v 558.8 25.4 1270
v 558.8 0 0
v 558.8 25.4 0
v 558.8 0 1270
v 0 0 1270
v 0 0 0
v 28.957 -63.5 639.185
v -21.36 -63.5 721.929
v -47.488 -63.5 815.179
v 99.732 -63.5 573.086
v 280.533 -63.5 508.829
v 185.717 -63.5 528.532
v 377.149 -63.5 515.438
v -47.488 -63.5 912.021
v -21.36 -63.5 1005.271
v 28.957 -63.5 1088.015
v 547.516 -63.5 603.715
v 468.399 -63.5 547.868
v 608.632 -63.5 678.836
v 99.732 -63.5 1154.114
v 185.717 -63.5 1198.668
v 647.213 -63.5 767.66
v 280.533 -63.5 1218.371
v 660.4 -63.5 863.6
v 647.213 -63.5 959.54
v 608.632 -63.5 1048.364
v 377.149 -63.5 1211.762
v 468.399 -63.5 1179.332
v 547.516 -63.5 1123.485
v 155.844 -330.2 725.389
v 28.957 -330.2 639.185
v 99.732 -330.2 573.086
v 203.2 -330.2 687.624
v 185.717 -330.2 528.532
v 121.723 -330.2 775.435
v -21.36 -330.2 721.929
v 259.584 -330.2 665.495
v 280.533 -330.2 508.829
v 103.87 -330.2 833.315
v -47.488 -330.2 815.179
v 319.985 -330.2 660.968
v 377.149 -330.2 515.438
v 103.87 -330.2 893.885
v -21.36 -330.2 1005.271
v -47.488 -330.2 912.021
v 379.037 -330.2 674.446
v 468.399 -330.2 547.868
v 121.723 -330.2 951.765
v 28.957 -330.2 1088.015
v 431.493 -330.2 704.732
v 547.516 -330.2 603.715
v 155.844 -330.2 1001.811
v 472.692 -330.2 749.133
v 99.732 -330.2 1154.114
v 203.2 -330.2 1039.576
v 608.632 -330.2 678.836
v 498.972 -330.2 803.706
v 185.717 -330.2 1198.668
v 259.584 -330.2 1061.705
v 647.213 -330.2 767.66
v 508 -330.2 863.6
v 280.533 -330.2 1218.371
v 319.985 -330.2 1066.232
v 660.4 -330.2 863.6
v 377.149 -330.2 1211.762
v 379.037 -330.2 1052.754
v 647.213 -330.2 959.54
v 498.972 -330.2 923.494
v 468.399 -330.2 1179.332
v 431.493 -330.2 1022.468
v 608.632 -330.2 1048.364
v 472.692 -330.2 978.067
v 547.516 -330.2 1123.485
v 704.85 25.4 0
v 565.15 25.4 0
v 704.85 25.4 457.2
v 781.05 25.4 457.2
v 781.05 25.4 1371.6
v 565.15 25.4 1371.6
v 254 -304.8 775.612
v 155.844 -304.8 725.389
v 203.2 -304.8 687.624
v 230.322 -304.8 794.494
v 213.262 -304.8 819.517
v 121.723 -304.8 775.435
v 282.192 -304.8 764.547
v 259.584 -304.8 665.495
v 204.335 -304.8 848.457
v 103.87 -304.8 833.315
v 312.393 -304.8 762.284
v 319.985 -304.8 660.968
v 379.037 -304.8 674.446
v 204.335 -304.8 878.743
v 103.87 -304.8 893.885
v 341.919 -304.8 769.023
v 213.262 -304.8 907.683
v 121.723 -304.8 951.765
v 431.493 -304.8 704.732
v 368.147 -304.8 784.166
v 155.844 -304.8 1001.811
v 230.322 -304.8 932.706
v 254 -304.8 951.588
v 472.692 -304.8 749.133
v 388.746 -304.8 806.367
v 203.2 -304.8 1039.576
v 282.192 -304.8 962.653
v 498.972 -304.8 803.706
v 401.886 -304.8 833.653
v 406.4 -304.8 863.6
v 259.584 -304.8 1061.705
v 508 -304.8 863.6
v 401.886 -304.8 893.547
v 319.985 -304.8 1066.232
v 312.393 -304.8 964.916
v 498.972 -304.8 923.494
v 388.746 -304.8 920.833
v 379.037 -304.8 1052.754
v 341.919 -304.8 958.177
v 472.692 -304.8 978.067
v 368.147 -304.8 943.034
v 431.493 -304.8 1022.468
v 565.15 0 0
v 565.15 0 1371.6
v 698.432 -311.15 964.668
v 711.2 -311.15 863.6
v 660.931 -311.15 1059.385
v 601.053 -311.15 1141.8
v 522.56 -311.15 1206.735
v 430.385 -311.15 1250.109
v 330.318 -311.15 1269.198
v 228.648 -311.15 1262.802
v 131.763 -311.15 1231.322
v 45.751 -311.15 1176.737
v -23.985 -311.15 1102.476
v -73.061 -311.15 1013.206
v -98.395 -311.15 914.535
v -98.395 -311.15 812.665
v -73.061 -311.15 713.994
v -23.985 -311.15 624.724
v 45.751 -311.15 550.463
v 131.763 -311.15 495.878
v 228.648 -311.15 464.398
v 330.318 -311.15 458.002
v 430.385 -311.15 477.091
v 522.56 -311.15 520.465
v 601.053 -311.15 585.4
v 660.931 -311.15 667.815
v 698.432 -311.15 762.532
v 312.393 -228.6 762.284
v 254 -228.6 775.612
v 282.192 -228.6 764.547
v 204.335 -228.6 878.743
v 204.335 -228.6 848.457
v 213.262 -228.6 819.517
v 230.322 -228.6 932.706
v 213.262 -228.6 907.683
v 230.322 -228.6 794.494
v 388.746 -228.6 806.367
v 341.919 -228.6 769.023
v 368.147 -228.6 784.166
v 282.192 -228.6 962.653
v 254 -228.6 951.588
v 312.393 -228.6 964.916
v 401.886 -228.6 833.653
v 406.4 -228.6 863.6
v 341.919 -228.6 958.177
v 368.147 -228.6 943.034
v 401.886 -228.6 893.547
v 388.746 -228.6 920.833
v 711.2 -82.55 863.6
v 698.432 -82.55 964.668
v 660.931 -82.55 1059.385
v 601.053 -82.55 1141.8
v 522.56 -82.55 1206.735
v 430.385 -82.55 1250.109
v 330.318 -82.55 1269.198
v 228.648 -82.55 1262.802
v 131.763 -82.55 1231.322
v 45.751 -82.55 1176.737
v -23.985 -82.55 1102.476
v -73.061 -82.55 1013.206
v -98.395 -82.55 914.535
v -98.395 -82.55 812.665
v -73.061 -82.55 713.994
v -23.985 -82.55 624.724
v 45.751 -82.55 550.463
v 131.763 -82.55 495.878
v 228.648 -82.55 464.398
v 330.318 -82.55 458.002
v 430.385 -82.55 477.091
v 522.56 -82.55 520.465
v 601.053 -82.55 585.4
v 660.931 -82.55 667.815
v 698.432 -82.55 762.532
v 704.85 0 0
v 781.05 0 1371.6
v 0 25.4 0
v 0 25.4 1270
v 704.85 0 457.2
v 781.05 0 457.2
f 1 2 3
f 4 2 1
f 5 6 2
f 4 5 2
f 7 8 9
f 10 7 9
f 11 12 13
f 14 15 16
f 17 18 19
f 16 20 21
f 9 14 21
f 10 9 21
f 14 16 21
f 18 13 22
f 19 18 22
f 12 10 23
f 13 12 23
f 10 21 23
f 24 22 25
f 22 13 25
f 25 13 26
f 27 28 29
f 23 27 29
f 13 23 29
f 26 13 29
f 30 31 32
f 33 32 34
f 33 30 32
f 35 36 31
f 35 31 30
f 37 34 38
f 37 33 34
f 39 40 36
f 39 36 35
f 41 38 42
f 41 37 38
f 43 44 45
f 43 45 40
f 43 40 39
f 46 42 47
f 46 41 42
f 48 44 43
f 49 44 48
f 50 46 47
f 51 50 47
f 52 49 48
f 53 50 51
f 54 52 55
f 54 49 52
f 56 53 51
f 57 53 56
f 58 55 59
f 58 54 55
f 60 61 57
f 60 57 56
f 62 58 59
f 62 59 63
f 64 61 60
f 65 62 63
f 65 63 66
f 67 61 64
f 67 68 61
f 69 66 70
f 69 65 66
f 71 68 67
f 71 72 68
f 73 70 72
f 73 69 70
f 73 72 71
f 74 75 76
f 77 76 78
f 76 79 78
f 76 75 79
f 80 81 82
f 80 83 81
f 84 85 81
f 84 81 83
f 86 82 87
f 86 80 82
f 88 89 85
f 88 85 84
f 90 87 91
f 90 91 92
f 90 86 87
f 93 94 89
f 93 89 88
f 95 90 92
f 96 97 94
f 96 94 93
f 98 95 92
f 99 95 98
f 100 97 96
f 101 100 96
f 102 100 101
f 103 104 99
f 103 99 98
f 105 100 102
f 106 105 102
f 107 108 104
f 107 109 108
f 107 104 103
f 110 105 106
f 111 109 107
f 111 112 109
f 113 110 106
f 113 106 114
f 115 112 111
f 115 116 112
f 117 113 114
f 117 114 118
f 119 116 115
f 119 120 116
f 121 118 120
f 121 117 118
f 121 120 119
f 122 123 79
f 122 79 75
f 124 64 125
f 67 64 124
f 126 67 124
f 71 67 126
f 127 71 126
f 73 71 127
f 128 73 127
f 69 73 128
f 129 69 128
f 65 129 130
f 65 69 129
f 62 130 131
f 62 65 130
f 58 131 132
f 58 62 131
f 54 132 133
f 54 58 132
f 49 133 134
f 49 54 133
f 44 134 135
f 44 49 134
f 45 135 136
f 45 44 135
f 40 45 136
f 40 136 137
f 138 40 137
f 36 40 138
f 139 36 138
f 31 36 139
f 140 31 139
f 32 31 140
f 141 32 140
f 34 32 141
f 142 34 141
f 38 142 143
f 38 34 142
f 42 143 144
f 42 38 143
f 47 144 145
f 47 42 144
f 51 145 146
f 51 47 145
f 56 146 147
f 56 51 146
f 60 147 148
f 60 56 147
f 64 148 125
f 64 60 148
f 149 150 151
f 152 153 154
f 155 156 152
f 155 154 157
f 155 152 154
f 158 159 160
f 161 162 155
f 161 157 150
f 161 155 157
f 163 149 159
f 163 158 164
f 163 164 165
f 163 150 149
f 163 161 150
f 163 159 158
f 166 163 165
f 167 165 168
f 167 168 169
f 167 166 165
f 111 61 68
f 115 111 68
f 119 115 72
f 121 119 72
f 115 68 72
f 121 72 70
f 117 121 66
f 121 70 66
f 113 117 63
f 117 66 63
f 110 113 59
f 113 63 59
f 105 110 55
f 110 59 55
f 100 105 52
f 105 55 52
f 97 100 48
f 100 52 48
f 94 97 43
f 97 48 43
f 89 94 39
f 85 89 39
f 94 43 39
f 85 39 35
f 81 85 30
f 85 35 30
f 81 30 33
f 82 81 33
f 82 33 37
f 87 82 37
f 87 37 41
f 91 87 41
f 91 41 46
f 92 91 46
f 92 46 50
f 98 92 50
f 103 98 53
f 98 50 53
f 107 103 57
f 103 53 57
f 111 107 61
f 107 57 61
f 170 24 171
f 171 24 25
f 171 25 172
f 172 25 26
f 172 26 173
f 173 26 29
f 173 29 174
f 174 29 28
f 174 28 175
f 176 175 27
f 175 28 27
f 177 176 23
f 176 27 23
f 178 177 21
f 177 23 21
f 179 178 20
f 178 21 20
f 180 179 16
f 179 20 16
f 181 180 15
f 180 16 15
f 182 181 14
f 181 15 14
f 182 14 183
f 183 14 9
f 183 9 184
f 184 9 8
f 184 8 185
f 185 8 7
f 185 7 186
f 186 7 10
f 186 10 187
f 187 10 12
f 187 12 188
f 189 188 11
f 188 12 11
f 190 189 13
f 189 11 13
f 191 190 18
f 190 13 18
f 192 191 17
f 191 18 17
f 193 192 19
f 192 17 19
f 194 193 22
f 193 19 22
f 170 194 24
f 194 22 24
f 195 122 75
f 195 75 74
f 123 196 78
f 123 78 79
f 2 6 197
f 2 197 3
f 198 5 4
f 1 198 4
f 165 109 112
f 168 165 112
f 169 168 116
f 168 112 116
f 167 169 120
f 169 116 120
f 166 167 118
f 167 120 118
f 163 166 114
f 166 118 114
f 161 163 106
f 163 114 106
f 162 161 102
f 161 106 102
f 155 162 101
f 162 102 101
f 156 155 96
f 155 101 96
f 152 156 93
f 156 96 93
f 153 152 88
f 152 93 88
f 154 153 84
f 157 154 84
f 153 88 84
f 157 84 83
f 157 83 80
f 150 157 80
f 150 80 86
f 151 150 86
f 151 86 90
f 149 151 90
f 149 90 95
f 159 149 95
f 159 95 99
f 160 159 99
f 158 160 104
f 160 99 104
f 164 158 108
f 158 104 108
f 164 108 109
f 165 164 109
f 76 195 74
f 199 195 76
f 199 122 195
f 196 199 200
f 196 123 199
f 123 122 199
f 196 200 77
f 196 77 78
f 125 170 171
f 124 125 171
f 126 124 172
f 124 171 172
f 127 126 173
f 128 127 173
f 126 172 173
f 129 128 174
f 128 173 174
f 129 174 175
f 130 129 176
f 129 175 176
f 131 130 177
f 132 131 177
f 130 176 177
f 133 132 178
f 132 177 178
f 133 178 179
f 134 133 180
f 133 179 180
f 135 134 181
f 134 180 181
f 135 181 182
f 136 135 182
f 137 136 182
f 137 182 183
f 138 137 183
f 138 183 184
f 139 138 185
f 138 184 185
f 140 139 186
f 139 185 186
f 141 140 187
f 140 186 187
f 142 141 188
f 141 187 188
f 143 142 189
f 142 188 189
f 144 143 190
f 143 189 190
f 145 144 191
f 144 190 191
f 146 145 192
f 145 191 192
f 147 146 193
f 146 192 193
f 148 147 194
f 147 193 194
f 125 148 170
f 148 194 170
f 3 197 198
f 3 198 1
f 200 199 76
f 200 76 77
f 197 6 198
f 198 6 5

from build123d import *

# Parameters (mm, degrees)
F0_W     = 558.8
F0_H     = 1270
F1_DEPTH = 25.4
F3_START = 63.5
F2_R     = 406.4
F3_DEPTH = 266.7
F4_SIZE2 = 50.8
F4_SIZE  = 19.05
F5_R     = 203.2
F6_DEPTH = 25.4
F7_R     = 101.6
F8_DEPTH = 76.2


with BuildPart() as f1:
    # F0 (on Front) → F1 (new body)
    with BuildSketch(Plane.XZ):
        with Locations((279.4, 635)):
            Rectangle(F0_W, F0_H)
    extrude(amount=-F1_DEPTH)


with BuildPart() as f1b:
    # F0 (on Front) → F1, piece 2 (new body)
    with BuildSketch(Plane.XZ):
        Polygon((565.15, 1371.6), (565.15, 0), (704.85, 0), (704.85, 457.2), (781.05, 457.2), (781.05, 1371.6), align=None)
    extrude(amount=-F1_DEPTH)


with BuildPart() as f3:
    # F2 (on Front) → F3 (new body)
    with BuildSketch(Plane.XZ.offset(F3_START)):
        with Locations((304.8, 863.6)):
            Circle(F2_R)
    extrude(amount=F3_DEPTH)

    # F4
    f4_edges = [f3.edges().sort_by_distance(p)[0] for p in [
        (-101.6, -330.2, 863.6),
        (-101.6, -63.5, 863.6),
    ]]
    f4_side = f3.faces().sort_by_distance((-101.6, -196.85, 863.6))[0]
    chamfer(f4_edges, length=F4_SIZE, length2=F4_SIZE2, reference=f4_side)

    # F5 (on face) → F6 (cut)
    with BuildSketch(Plane.XZ.offset(330.2)):
        with Locations((304.8, 863.6)):
            Circle(F5_R)
    extrude(amount=-F6_DEPTH, mode=Mode.SUBTRACT)

    # F7 (on face) → F8 (cut)
    with BuildSketch(Plane.XZ.offset(304.8)):
        with Locations((304.8, 863.6)):
            Circle(F7_R)
    extrude(amount=-F8_DEPTH, mode=Mode.SUBTRACT)


solid = Compound([f1.part, f1b.part, f3.part])
